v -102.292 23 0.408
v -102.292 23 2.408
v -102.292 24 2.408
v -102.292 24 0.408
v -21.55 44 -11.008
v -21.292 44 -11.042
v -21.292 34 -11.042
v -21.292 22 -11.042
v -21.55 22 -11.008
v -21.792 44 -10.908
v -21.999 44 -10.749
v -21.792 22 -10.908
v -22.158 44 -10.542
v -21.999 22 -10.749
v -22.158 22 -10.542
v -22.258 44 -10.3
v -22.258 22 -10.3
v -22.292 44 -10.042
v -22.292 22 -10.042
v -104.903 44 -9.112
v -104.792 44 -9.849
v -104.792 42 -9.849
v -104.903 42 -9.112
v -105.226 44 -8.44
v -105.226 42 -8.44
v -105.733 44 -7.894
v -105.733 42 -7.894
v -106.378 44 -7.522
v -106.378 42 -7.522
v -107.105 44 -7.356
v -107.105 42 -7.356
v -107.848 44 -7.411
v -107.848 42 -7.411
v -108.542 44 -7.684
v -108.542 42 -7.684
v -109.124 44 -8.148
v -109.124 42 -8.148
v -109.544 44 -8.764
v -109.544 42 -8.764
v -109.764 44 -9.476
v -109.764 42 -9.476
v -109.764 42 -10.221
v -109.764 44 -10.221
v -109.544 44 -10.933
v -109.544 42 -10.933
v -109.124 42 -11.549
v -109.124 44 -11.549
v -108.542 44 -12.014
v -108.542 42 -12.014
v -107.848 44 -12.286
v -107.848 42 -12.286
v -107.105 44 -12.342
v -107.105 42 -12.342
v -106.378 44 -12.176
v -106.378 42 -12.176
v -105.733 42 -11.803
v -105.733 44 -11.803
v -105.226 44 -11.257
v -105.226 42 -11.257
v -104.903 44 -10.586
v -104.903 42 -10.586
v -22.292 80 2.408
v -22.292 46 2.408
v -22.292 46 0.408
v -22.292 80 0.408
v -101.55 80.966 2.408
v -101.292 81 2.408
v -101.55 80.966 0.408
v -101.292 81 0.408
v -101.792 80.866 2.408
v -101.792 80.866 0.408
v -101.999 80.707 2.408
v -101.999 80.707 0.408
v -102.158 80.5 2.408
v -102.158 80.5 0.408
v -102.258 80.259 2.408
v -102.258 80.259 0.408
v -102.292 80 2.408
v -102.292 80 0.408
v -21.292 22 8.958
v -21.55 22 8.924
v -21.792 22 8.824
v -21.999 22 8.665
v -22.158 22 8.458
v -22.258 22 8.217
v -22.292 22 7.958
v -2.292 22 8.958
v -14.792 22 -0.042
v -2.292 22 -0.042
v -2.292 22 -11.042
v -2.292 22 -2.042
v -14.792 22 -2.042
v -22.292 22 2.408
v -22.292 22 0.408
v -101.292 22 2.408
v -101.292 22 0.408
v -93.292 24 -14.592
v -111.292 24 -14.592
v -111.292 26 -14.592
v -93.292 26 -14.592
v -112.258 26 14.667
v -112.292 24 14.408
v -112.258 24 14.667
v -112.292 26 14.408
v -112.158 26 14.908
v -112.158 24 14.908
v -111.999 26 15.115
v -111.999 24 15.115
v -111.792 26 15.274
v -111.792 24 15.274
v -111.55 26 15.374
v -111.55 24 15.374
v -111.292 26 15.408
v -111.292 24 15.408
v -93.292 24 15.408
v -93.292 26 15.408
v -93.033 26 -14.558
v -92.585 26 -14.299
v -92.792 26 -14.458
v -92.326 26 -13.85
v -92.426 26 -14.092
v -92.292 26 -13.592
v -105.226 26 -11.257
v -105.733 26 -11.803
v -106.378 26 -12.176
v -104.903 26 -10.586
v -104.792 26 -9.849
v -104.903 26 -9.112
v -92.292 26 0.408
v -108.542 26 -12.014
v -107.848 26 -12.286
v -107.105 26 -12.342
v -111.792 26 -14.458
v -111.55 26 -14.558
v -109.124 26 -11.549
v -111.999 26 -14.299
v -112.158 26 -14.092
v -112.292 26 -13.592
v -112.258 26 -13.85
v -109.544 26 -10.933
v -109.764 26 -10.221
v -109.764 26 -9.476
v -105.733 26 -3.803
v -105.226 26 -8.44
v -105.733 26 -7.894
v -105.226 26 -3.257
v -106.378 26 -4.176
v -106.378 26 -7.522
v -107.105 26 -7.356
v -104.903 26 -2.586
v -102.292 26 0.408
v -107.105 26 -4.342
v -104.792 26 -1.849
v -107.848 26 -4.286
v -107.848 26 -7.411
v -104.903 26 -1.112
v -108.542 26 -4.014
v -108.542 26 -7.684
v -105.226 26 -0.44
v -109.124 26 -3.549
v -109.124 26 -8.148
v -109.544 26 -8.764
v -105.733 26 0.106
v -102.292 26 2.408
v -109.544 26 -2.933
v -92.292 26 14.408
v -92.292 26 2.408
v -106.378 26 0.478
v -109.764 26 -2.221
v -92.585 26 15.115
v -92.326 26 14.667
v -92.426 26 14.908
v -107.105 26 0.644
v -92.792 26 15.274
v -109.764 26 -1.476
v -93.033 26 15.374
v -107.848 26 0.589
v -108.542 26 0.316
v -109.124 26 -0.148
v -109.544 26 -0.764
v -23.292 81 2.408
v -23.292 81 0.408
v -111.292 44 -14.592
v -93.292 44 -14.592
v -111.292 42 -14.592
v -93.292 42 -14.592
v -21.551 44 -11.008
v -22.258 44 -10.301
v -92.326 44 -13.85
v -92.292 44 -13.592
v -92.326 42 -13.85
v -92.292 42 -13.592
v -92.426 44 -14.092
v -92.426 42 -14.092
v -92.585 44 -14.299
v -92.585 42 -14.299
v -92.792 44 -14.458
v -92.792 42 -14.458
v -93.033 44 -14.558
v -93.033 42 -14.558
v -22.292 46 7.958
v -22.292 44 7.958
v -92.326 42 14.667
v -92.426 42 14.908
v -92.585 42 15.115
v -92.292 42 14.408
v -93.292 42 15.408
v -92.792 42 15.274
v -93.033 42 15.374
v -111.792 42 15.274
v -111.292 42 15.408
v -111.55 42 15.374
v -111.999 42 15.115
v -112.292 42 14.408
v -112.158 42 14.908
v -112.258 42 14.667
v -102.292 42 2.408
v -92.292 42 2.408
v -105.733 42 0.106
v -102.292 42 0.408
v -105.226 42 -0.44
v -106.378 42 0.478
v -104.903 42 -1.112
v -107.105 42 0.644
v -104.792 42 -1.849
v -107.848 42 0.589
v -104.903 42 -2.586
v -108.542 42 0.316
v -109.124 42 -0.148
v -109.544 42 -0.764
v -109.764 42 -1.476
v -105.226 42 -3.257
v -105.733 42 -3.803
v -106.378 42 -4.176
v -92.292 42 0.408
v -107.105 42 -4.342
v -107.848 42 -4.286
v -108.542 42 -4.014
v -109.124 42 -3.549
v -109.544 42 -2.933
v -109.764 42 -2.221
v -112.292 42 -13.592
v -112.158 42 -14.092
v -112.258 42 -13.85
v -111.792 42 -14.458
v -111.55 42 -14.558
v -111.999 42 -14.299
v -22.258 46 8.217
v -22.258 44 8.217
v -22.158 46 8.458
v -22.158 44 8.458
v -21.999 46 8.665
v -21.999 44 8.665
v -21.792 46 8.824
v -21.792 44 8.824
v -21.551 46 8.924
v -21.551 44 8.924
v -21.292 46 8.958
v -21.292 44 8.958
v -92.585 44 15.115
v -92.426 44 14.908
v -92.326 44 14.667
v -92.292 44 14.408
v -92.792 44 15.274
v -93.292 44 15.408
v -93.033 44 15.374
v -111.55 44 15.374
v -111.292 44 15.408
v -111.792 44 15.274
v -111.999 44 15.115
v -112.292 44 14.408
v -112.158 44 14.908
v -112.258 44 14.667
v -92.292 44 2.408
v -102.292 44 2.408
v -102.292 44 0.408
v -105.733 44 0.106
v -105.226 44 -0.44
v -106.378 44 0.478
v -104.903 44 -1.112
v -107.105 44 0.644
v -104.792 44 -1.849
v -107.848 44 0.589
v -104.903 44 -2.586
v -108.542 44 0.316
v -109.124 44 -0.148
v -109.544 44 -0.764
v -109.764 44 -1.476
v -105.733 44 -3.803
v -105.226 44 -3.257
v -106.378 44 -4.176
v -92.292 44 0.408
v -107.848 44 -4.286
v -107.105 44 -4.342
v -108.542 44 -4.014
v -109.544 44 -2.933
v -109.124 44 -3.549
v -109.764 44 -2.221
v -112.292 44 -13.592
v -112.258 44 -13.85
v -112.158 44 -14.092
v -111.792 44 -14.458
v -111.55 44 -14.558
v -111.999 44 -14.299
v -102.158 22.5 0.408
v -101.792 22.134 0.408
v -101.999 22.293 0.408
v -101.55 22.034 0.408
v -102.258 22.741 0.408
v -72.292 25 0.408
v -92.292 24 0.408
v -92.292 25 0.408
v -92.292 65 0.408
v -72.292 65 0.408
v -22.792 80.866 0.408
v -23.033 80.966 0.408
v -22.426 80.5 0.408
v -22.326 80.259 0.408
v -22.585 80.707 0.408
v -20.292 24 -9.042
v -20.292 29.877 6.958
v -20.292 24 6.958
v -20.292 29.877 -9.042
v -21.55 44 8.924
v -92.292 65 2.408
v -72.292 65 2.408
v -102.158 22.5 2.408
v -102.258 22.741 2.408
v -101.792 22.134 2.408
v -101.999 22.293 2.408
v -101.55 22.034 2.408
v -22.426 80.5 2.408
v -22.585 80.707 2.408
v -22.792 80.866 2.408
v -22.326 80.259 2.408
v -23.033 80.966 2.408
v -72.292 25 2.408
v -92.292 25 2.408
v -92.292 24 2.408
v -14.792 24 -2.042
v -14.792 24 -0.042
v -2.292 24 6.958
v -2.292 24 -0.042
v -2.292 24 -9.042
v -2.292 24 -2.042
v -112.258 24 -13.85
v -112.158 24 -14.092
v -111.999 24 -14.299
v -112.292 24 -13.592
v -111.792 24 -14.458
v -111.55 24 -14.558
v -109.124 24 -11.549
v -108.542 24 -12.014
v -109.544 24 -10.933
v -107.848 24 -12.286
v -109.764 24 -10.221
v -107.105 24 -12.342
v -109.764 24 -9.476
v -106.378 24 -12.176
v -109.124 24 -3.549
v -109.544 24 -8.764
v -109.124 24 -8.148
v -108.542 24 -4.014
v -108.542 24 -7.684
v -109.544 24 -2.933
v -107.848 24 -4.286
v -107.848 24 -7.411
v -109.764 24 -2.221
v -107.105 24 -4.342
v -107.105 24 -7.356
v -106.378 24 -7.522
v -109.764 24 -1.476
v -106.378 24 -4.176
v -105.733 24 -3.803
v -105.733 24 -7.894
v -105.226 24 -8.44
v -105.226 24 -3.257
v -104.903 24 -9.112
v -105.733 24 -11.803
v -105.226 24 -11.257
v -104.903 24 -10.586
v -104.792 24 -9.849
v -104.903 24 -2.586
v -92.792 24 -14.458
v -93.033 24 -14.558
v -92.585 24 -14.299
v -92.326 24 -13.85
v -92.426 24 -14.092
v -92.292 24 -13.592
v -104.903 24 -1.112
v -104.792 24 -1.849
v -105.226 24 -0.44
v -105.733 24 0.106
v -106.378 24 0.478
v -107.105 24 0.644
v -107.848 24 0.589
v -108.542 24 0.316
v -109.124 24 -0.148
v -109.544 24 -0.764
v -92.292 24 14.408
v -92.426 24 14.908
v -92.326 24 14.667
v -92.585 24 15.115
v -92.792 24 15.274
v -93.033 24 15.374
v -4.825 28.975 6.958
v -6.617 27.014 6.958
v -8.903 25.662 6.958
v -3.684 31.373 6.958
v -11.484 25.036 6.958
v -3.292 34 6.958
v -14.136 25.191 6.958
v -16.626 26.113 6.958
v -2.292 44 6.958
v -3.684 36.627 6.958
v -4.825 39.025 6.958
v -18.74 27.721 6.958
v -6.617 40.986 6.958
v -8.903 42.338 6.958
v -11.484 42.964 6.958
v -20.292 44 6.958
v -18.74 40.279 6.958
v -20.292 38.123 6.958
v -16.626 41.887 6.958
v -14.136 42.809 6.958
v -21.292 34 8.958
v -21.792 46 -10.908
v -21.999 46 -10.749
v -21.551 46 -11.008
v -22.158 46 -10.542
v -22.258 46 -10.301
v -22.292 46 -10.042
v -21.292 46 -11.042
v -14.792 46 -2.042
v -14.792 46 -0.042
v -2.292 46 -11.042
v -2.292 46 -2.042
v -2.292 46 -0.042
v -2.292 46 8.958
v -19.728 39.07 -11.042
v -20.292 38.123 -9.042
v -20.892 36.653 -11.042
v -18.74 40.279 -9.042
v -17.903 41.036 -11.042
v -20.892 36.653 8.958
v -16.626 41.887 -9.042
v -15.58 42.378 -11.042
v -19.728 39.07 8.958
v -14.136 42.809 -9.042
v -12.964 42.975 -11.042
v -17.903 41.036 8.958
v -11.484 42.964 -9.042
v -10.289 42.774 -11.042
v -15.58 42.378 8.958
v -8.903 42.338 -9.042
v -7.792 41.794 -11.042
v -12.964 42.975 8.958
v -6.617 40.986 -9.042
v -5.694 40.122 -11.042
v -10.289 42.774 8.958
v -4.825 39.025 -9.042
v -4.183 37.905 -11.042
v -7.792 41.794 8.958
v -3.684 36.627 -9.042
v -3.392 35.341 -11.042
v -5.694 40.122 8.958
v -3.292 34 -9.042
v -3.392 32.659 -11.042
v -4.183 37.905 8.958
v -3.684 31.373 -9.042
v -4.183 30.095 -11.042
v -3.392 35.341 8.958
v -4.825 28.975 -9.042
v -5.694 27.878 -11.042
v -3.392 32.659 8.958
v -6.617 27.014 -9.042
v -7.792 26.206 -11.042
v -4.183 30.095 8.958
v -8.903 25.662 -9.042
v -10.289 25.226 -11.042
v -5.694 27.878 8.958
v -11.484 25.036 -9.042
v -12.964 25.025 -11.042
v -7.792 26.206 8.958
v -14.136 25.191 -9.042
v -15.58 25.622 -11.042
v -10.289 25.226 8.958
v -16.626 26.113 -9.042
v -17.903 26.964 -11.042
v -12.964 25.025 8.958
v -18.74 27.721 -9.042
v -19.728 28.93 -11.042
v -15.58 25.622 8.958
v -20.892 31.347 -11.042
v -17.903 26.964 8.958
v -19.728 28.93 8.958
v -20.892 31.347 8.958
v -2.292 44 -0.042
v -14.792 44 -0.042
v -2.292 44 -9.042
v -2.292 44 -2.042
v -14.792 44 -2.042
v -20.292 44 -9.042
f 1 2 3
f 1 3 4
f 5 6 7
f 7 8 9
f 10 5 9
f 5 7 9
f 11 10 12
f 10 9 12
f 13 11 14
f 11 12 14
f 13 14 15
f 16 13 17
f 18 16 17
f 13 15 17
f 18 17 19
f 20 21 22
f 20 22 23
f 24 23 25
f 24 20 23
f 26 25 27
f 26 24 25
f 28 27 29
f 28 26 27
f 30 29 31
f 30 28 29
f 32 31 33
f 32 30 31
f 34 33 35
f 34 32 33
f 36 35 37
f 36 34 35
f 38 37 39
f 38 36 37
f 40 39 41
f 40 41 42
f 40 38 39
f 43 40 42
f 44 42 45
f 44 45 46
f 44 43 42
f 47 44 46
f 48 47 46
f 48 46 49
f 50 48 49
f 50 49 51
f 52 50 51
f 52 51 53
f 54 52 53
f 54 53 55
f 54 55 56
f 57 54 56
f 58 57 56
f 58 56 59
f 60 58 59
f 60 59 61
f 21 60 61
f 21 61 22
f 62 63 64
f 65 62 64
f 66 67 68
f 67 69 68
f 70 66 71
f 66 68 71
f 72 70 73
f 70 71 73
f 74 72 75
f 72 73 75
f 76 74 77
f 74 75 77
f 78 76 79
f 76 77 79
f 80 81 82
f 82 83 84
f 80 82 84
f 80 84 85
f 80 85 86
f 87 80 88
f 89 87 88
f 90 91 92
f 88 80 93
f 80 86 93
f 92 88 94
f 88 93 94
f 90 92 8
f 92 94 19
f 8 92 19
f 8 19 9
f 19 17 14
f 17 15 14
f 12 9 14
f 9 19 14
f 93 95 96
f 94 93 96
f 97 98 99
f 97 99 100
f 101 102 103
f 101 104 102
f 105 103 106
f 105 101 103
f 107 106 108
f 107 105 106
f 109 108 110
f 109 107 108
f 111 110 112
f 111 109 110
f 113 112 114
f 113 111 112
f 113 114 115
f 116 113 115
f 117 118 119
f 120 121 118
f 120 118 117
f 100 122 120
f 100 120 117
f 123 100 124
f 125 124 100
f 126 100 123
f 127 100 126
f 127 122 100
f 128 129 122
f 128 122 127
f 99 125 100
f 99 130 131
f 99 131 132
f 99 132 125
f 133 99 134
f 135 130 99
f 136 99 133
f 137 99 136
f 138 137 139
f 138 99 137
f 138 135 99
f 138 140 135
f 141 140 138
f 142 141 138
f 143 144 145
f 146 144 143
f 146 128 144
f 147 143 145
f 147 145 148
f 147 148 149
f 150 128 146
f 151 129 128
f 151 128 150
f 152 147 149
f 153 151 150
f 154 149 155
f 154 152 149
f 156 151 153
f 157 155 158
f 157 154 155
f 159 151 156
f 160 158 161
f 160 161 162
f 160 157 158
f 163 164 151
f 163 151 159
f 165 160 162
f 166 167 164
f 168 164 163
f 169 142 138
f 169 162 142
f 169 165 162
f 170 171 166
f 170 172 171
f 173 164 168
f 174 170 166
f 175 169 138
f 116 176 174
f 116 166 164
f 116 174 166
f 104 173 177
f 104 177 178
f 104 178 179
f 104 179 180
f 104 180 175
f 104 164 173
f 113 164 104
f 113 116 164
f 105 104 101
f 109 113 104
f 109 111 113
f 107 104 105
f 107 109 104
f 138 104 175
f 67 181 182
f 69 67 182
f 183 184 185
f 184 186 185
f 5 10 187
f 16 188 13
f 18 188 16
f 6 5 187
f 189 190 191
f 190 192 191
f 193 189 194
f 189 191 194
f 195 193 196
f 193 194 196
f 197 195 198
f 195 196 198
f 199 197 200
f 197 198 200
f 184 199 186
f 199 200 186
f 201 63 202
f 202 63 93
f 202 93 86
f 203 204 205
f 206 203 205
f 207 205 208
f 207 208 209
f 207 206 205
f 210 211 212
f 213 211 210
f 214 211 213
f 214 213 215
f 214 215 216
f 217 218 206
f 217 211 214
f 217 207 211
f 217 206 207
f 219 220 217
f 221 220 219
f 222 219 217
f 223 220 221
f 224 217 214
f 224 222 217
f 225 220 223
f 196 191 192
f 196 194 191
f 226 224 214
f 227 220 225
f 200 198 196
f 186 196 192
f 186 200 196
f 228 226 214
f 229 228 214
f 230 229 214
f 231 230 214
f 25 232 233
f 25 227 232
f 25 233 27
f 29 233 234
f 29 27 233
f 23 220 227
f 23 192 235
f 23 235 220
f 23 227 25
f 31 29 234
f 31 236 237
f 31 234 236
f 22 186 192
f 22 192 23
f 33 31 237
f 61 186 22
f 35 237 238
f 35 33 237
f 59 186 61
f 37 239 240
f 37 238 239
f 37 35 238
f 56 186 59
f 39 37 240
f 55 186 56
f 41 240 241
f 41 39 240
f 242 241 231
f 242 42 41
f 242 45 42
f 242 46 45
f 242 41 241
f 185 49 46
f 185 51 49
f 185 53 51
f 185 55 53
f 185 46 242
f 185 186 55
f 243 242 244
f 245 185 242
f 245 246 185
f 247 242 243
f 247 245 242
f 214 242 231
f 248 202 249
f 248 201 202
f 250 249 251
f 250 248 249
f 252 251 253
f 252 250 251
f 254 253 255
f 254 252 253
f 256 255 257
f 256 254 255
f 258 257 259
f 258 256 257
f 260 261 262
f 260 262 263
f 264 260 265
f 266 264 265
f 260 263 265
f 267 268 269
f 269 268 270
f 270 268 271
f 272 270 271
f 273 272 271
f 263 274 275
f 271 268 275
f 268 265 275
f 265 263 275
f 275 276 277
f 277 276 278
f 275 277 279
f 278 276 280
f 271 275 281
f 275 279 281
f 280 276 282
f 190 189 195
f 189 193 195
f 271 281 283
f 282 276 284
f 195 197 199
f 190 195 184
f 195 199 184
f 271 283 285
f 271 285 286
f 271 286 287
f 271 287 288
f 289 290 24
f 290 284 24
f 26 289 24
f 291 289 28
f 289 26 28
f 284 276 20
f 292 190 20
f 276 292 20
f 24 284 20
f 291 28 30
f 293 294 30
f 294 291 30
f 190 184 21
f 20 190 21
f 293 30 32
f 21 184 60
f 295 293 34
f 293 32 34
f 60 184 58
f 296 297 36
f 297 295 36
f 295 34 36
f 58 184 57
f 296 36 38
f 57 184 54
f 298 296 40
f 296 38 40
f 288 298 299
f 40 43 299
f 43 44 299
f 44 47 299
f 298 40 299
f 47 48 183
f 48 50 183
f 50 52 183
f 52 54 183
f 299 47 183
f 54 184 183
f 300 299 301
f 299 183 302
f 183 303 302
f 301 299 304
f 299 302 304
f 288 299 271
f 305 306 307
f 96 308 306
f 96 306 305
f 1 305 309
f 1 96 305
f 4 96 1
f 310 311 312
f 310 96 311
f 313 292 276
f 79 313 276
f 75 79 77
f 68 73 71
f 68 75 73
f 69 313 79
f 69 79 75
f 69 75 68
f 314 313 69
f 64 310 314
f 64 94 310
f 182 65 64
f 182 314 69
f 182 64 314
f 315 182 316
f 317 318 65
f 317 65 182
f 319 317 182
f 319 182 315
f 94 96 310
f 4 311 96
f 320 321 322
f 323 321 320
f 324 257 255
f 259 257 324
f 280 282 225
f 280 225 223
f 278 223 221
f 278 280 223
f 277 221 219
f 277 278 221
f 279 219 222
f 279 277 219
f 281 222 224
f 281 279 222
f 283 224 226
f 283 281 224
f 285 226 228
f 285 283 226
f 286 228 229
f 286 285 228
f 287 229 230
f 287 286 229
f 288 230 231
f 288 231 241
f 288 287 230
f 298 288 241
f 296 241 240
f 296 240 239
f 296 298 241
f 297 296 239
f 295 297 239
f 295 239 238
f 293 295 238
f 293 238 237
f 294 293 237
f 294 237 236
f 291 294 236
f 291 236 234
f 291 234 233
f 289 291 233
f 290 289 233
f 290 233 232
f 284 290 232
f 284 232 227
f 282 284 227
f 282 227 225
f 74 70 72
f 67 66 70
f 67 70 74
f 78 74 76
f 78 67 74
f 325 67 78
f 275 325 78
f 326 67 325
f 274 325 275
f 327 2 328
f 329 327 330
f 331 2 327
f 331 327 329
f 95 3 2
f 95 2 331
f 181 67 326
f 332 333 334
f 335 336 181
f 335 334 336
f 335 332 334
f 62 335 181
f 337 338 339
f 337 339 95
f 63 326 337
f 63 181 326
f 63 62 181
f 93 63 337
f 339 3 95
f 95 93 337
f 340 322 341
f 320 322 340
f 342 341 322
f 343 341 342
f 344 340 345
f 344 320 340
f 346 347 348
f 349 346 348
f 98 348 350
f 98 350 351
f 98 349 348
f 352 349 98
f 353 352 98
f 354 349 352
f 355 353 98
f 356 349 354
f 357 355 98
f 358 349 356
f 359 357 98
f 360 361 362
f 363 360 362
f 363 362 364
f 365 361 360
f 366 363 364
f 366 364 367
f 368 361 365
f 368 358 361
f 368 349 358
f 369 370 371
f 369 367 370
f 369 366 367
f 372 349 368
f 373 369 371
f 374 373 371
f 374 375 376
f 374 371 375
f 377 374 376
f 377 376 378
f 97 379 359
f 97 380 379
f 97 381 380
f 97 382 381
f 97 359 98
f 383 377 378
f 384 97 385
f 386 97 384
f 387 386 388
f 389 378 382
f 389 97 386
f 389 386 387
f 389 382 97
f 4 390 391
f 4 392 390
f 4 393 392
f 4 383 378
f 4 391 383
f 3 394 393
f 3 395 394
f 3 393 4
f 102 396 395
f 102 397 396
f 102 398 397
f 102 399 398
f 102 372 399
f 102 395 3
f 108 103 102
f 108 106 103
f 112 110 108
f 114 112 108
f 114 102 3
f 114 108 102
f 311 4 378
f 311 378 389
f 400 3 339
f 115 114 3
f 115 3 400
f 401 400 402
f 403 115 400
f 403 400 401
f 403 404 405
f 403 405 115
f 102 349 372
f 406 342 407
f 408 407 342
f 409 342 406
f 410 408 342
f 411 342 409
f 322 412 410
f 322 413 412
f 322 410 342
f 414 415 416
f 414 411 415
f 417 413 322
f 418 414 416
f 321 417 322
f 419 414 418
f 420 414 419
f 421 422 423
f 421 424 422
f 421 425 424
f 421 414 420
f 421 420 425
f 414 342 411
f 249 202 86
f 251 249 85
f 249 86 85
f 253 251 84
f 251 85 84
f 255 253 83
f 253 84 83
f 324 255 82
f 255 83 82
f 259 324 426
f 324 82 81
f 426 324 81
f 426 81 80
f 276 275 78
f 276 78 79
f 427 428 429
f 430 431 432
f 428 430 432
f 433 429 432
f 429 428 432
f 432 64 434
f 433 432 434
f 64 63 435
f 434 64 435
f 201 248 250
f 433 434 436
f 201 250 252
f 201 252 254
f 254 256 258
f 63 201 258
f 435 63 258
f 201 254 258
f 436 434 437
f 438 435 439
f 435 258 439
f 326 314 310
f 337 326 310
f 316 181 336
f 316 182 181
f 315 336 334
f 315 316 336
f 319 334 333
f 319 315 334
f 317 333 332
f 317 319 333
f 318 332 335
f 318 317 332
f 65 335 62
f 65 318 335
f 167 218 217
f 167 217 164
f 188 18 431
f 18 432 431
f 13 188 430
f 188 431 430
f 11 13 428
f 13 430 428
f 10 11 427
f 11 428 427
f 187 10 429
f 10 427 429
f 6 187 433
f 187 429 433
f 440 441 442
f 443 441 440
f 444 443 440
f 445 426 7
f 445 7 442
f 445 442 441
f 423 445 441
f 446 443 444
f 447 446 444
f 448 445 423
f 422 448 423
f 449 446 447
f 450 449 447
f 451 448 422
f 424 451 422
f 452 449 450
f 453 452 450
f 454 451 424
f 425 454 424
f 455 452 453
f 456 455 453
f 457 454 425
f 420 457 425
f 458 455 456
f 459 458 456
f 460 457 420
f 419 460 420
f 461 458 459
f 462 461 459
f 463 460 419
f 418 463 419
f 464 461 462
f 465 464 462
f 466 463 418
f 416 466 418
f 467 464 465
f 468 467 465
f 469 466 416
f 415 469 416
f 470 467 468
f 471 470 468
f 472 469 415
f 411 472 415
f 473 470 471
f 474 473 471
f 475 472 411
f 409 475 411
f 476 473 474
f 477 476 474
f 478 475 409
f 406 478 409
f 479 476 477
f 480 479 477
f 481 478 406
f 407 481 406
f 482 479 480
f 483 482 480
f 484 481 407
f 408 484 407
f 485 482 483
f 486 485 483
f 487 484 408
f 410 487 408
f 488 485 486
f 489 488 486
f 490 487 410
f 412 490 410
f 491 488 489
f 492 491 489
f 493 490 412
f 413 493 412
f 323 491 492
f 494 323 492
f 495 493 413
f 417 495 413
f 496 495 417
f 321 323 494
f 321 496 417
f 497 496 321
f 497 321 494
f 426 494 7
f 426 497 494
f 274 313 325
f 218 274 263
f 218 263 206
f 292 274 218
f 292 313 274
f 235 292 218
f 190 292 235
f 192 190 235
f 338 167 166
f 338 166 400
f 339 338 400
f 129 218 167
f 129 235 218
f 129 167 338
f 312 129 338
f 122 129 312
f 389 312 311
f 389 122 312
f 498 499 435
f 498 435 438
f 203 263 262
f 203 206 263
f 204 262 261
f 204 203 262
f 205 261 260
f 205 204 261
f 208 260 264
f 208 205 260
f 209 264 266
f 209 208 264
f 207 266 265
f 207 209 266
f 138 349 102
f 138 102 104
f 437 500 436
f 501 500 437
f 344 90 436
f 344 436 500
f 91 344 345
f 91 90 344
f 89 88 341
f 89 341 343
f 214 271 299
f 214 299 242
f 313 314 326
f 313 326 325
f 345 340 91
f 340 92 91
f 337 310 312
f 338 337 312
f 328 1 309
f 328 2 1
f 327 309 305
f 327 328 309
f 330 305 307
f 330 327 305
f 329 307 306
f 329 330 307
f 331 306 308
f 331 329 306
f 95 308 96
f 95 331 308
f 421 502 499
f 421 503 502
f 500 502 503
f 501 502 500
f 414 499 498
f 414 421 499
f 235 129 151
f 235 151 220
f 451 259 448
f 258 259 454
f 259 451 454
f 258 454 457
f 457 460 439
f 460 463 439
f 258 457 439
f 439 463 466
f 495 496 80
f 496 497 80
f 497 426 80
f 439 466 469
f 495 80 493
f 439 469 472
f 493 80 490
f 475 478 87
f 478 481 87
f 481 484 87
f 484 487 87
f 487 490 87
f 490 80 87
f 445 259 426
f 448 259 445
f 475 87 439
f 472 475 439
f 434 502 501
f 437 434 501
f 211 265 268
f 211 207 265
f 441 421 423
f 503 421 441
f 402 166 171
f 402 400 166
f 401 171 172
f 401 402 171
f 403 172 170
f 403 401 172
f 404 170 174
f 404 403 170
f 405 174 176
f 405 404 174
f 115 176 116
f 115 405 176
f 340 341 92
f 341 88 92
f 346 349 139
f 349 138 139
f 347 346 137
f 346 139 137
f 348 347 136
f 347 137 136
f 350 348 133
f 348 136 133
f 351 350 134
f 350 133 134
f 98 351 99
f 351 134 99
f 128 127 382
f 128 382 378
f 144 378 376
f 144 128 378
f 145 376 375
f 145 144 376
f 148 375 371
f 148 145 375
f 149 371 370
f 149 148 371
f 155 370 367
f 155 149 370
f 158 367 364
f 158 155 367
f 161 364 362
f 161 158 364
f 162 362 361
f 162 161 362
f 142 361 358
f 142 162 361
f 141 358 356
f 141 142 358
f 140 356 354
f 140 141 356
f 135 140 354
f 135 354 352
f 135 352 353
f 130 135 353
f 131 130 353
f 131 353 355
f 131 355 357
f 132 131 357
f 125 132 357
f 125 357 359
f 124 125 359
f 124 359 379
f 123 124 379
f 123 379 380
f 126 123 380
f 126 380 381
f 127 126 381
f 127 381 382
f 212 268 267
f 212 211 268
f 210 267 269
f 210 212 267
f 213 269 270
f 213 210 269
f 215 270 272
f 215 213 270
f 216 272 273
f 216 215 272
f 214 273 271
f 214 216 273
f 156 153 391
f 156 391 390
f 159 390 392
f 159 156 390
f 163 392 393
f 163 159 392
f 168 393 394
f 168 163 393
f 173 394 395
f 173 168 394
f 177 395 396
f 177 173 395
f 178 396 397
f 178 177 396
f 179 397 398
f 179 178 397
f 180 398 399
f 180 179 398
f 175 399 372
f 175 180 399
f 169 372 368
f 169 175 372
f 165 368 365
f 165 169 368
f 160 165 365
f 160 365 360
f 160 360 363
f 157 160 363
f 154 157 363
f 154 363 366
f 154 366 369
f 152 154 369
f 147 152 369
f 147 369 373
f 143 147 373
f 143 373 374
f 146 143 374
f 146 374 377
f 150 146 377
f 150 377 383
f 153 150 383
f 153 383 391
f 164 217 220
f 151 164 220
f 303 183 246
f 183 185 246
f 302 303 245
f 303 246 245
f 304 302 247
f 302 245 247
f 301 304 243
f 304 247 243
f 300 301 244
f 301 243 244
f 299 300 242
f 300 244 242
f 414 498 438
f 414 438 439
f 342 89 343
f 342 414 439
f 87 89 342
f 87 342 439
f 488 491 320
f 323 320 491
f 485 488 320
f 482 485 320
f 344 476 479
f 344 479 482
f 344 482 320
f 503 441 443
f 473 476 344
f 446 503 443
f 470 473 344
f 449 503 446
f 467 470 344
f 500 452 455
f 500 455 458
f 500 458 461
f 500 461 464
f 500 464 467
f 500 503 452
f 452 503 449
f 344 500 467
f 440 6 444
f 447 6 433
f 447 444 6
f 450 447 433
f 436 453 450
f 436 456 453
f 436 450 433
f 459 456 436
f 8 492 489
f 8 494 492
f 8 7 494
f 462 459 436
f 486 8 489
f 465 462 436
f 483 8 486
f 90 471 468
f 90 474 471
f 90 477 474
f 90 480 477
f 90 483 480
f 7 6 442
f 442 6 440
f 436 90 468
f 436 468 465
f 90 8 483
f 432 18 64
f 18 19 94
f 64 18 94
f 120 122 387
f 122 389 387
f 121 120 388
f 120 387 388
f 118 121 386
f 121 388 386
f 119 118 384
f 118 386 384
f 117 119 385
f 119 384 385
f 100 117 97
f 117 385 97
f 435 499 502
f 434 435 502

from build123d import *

# Parameters (mm, degrees)
BOSS_EXTRUDE1_DEPTH = 20
FILLET1_R           = 1
SKETCH2_R           = 9
CUT_EXTRUDE1_DEPTH  = 20
BOSS_EXTRUDE2_START = 2
BOSS_EXTRUDE2_DEPTH = 2
SKETCH4_W           = 20
SKETCH4_H           = 20
BOSS_EXTRUDE3_DEPTH = 2
FILLET2_R           = 1
SKETCH5_W           = 12.5
SKETCH5_H           = 2
CUT_EXTRUDE2_DEPTH  = 24
BOSS_EXTRUDE4_DEPTH = 80
FILLET3_R           = 1
SKETCH8_R           = 7.11392485
SKETCH8_W           = 20
SKETCH8_H           = 40
CUT_EXTRUDE3_DEPTH  = 2
SKETCH9_W           = 20
SKETCH9_H           = 2
BOSS_EXTRUDE5_DEPTH = 15
FILLET4_R           = 1
SKETCH10_R          = 2.5
CUT_EXTRUDE4_DEPTH  = 20
CUT_EXTRUDE5_DEPTH  = 1000
SKETCH12_W          = 38.052123651
SKETCH12_H          = 24.689337754
CUT_EXTRUDE6_DEPTH  = 200


with BuildPart() as part:
    # Sketch1 → Boss-Extrude1 (new body)
    with BuildSketch(Plane(origin=(0, 0, 0), x_dir=(1, 0, 0), z_dir=(0, 1, 0))):
        Polygon((-2.291666667, 11.041666667), (-22.291666667, 11.041666667), (-22.291666667, -8.958333333), (-2.291666667, -8.958333333), (-2.291666667, -6.958333333), (-20.291666667, -6.958333333), (-20.291666667, 9.041666667), (-2.291666667, 9.041666667), align=None)
    extrude(amount=BOSS_EXTRUDE1_DEPTH)

    # Fillet1
    fillet1_edges = [part.edges().sort_by_distance(p)[0] for p in [
        (-22.291666667, 10, 8.958333333),
        (-22.291666667, 10, -11.041666667),
    ]]
    fillet(fillet1_edges, radius=FILLET1_R)

    # Sketch2 → Cut-Extrude1 (cut)
    with BuildSketch(Plane.XY.offset(8.958333333)):
        with Locations(Location((-12.291666667, 10, 0), (0, 0, 180))):
            Circle(SKETCH2_R)
    extrude(amount=-CUT_EXTRUDE1_DEPTH, mode=Mode.SUBTRACT)

    # Sketch3 → Boss-Extrude2 (add)
    with BuildSketch(Plane(origin=(0, 20, 0), x_dir=(1, 0, 0), z_dir=(0, 1, 0)).offset(BOSS_EXTRUDE2_START)):
        Polygon((-2.291666667, 2.377848536), (-2.291666667, 9.041666667), (-20.291666667, 9.041666667), (-20.291666667, -6.958333333), (-2.291666667, -6.958333333), (-2.291666667, 0.377848536), align=None)
        with BuildLine():
            Line((-2.291666667, 9.041666667), (-2.291666667, 11.041666667))
            Line((-2.291666667, 11.041666667), (-21.291666667, 11.041666667))
            ThreePointArc((-21.291666667, 11.041666667), (-21.998773448, 10.748773448), (-22.291666667, 10.041666667))
            Line((-22.291666667, 10.041666667), (-22.291666667, -7.958333333))
            ThreePointArc((-22.291666667, -7.958333333), (-21.998773448, -8.665440115), (-21.291666667, -8.958333333))
            Line((-21.291666667, -8.958333333), (-2.291666667, -8.958333333))
            Line((-2.291666667, -8.958333333), (-2.291666667, -6.958333333))
            Line((-2.291666667, -6.958333333), (-20.291666667, -6.958333333))
            Line((-20.291666667, -6.958333333), (-20.291666667, 9.041666667))
            Line((-20.291666667, 9.041666667), (-2.291666667, 9.041666667))
        make_face()
    extrude(amount=-BOSS_EXTRUDE2_DEPTH)

    # Sketch4 → Boss-Extrude3 (add)
    with BuildSketch(Plane.XZ):
        with Locations((-12.291666667, -1.041666667)):
            Rectangle(SKETCH4_W, SKETCH4_H)
    extrude(amount=BOSS_EXTRUDE3_DEPTH)

    # Fillet2
    fillet2_edges = [part.edges().sort_by_distance(p)[0] for p in [
        (-22.291666667, -1, -11.041666667),
        (-22.291666667, -1, 8.958333333),
    ]]
    fillet(fillet2_edges, radius=FILLET2_R - 0.0001)  # a hair under: the kernel refuses the full size

    # Sketch5 → Cut-Extrude2 (cut)
    with BuildSketch(Plane(origin=(0, 22, 0), x_dir=(1, 0, 0), z_dir=(0, 1, 0))):
        with Locations((-8.541666667, 1.041666667)):
            Rectangle(SKETCH5_W, SKETCH5_H)
    extrude(amount=-CUT_EXTRUDE2_DEPTH, mode=Mode.SUBTRACT)

    # Sketch6 → Boss-Extrude4 (add)
    with BuildSketch(Plane.ZY.offset(22.291666667)):
        Polygon((2.408333333, -37), (0.408333333, -37), (0.408333333, -2), (0.408333333, 22), (2.408333333, 22), (2.408333333, -2), align=None)
    extrude(amount=BOSS_EXTRUDE4_DEPTH)

    # Fillet3
    fillet3_edges = [part.edges().sort_by_distance(p)[0] for p in [
        (-22.291666667, -37, 1.408333333),
        (-102.291666667, 22, 1.408333333),
        (-102.291666667, -37, 1.408333333),
    ]]
    fillet(fillet3_edges, radius=FILLET3_R)

    # Sketch8 → Cut-Extrude3 (cut)
    with BuildSketch(Plane(origin=(0, 0, 0.408333333), x_dir=(-1, 0, 0), z_dir=(0, 0, -1))):
        with Locations((12.291666667, 10)):
            Circle(SKETCH8_R)
        with Locations((82.291666667, -1)):
            Rectangle(SKETCH8_W, SKETCH8_H)
    extrude(amount=-CUT_EXTRUDE3_DEPTH, mode=Mode.SUBTRACT)

    # Sketch9 → Boss-Extrude5 (add, symmetric)
    with BuildSketch(Plane(origin=(0, 0, 0.408333333), x_dir=(-1, 0, 0), z_dir=(0, 0, -1))):
        Polygon((92.470978063, 20), (102.291666667, 20), (112.291666667, 20), (112.291666667, 18), (102.291666667, 18), (92.291666667, 18), (92.291666667, 20), align=None)
        with Locations((102.291666667, 1)):
            Rectangle(SKETCH9_W, SKETCH9_H)
    extrude(amount=BOSS_EXTRUDE5_DEPTH, both=True)

    # Fillet4
    fillet4_edges = [part.edges().sort_by_distance(p)[0] for p in [
        (-92.291666667, 19, 15.408333333),
        (-112.291666667, 19, 15.408333333),
        (-92.291666667, 19, -14.591666667),
        (-112.291666667, 19, -14.591666667),
        (-92.291666667, 1, 15.408333333),
        (-112.291666667, 1, 15.408333333),
        (-92.291666667, 1, -14.591666667),
        (-112.291666667, 1, -14.591666667),
    ]]
    fillet(fillet4_edges, radius=FILLET4_R)

    # Sketch10 → Cut-Extrude4 (cut)
    with BuildSketch(Plane.XZ):
        with Locations((-107.291666667, -1.848697286)):
            Circle(SKETCH10_R)
        with Locations((-107.291666667, -9.848697286)):
            Circle(SKETCH10_R)
    extrude(amount=-CUT_EXTRUDE4_DEPTH, mode=Mode.SUBTRACT)

    # Mirror1: part across plane


with BuildPart() as part_1:
    add(part.part)
    add(part.part.mirror(Plane.ZX.offset(22)))

    # Sketch11 → Cut-Extrude5 (cut)
    with BuildSketch(Plane.ZY.offset(102.291666667)):
        Polygon((0.408333333, 22), (17.6685399, 22), (17.6685399, -41.876309172), (-35.169754822, -41.876309172), (-35.169754822, 22), align=None)
    extrude(amount=-CUT_EXTRUDE5_DEPTH, mode=Mode.SUBTRACT)


with BuildPart() as cut_extrude5_piece_1:
    # of the separate pieces the step leaves, piece 1, a body of its own (cut_extrude5_pieces)
    add(part_1.part.solids().sort_by_distance((-101.291666667, 22, 2.408333333))[0])


with BuildPart() as cut_extrude5_piece_2:
    # of the separate pieces the step leaves, piece 2, a body of its own (cut_extrude5_pieces)
    add(part_1.part.solids().sort_by_distance((-102.291666667, 2, -14.591666667))[0])


with BuildPart() as cut_extrude5_piece_3:
    # of the separate pieces the step leaves, piece 3, a body of its own (cut_extrude5_pieces)
    add(part_1.part.solids().sort_by_distance((-111.291666667, 20, 15.408333333))[0])


with BuildPart() as cut_extrude6_tool:
    # Sketch12 → Cut-Extrude6 (new body)
    with BuildSketch(Plane.ZY.offset(112.291666667)):
        with Locations((0.662862589, 8.620210787)):
            Rectangle(SKETCH12_W, SKETCH12_H)
    extrude(amount=-CUT_EXTRUDE6_DEPTH)


with BuildPart() as cut_extrude5_piece_2_1:
    add(cut_extrude5_piece_2.part)

    # Cut-Extrude6: cut by cut_extrude6_tool
    add(cut_extrude6_tool.part, mode=Mode.SUBTRACT)


with BuildPart() as cut_extrude5_piece_3_1:
    add(cut_extrude5_piece_3.part)

    # Cut-Extrude6: cut by cut_extrude6_tool
    add(cut_extrude6_tool.part, mode=Mode.SUBTRACT)


solid = cut_extrude5_piece_1.part
